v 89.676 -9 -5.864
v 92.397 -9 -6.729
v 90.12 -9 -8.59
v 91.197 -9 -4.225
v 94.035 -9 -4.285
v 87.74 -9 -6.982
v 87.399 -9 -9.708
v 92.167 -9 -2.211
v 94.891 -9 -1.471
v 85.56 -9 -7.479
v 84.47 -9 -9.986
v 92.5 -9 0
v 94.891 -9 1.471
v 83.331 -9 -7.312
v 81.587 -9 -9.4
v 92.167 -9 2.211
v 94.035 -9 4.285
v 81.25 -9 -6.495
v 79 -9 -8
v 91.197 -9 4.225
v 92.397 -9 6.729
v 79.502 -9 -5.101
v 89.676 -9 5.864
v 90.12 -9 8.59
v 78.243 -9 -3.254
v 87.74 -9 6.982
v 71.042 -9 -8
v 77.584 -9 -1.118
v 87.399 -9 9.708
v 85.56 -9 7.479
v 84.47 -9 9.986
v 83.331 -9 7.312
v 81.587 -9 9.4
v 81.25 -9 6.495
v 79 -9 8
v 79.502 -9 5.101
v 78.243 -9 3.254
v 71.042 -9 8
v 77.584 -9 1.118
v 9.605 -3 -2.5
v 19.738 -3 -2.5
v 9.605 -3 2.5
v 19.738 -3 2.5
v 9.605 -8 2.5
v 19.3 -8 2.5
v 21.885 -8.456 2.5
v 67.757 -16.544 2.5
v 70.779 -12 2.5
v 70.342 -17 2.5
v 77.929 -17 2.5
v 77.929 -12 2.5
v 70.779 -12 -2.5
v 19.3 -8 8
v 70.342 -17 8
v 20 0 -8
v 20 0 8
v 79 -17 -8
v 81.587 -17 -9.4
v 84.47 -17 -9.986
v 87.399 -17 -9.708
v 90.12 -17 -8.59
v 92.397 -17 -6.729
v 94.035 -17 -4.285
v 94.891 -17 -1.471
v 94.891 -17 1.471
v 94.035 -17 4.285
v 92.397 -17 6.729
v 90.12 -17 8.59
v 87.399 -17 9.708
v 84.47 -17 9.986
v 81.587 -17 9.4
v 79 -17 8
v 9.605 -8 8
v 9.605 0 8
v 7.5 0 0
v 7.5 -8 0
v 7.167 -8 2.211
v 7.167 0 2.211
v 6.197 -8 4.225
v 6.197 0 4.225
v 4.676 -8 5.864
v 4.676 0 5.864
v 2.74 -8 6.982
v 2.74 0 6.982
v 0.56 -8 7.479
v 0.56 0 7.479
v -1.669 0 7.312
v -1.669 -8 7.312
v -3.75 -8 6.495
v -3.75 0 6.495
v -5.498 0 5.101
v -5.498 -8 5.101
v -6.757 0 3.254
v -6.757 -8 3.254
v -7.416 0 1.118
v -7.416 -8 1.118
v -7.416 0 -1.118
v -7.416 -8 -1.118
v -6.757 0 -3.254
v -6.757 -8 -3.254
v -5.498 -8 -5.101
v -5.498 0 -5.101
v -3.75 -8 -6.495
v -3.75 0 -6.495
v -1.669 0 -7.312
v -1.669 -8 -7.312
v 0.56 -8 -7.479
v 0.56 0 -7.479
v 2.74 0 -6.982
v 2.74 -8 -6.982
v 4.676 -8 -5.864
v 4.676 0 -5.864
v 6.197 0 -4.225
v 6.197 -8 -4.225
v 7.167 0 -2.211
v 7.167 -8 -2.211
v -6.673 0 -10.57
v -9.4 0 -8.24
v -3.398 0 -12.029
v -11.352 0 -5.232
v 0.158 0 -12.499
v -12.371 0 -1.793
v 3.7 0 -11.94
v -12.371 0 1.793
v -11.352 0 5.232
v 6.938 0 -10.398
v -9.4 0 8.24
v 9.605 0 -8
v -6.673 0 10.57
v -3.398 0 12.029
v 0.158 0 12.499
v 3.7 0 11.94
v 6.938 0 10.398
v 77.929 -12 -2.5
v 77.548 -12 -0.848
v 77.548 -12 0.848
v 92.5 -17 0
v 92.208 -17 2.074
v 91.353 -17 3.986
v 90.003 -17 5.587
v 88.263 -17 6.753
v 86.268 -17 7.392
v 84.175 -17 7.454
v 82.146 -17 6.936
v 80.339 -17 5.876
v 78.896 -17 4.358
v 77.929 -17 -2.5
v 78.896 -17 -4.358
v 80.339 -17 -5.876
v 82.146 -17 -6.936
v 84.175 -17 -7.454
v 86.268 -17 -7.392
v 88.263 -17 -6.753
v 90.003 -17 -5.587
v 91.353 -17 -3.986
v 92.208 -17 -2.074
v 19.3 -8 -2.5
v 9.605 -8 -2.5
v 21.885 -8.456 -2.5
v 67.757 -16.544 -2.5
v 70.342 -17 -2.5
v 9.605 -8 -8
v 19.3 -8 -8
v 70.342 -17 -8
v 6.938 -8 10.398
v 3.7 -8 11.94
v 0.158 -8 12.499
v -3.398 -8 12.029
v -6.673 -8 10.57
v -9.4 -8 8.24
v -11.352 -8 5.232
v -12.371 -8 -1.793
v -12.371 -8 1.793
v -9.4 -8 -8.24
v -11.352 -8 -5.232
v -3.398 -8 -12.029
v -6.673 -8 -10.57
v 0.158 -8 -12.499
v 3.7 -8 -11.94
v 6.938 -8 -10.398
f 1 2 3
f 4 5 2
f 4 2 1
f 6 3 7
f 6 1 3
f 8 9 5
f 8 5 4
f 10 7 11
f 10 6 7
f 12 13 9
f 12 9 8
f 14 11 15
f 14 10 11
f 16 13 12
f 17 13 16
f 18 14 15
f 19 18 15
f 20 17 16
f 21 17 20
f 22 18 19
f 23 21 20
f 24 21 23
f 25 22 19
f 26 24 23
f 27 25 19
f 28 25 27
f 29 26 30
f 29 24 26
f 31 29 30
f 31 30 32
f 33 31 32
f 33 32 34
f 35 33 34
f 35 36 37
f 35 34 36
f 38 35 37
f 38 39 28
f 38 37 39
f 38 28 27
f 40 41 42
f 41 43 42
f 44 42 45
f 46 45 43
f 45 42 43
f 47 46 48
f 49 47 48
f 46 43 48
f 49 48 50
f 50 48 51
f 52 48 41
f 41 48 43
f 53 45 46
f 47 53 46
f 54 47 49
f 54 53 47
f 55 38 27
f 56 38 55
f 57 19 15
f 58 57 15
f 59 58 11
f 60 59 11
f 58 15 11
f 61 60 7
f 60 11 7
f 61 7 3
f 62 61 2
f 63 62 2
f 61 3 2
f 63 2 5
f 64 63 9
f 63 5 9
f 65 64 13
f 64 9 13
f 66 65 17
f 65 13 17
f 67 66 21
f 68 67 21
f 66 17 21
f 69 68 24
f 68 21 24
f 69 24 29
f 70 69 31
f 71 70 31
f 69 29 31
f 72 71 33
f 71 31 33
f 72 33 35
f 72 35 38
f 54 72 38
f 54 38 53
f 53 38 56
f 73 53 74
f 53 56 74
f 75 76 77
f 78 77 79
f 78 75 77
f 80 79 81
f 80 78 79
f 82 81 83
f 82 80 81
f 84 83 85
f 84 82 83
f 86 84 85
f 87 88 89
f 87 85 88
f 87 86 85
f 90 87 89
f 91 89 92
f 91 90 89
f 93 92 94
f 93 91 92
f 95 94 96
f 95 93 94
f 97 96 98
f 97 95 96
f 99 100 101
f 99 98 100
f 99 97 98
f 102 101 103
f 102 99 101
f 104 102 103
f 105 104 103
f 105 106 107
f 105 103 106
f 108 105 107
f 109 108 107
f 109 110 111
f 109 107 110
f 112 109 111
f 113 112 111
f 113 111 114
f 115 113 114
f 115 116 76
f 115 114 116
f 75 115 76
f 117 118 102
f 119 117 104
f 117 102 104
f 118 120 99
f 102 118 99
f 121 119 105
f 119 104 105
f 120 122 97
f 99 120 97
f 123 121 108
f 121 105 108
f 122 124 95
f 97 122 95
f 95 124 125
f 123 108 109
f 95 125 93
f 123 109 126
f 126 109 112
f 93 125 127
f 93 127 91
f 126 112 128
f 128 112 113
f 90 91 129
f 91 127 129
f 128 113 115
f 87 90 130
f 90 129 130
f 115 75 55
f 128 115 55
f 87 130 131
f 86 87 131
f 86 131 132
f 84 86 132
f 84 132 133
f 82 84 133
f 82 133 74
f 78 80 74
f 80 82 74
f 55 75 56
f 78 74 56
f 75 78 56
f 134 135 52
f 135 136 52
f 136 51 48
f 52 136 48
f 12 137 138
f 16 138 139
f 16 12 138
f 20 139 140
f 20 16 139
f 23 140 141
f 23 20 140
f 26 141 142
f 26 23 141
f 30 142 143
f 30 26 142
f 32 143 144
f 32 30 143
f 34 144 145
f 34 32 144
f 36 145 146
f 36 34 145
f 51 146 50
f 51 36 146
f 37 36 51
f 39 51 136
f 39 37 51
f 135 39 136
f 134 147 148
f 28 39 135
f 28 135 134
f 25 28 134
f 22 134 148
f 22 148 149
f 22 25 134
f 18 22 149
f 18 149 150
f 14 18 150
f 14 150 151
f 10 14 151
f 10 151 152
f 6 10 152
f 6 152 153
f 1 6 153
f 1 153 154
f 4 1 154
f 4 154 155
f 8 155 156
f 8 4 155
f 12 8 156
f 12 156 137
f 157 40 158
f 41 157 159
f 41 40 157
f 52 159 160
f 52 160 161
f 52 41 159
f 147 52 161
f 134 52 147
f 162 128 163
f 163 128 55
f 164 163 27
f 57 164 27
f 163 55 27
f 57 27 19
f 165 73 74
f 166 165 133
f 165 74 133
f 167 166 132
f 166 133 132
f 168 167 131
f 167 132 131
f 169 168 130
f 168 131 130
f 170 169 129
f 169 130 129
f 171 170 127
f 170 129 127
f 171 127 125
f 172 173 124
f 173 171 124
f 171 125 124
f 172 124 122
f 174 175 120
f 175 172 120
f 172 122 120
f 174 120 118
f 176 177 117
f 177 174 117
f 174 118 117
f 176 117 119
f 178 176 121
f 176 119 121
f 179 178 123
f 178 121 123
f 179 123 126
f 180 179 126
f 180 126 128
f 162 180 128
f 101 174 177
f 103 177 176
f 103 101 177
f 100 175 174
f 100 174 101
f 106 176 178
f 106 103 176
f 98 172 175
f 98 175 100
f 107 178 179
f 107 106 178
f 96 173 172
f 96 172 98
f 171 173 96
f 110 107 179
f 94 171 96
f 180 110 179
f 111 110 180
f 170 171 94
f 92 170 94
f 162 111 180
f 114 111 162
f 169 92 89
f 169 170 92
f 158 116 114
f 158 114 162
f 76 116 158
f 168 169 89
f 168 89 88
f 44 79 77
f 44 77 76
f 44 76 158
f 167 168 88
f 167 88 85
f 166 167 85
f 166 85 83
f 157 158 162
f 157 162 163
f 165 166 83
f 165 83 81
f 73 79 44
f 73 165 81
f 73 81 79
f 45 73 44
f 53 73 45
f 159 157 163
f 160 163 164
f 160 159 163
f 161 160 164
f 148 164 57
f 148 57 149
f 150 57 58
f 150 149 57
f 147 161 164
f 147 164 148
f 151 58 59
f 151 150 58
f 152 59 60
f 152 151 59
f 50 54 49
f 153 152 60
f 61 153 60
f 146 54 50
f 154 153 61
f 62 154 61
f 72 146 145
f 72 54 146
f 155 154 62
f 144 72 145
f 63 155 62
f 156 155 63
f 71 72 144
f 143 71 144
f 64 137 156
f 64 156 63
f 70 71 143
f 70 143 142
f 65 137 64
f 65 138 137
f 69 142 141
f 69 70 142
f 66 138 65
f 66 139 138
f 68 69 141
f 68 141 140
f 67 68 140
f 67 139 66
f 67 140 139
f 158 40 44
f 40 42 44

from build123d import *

# Parameters (mm, degrees)
F0_R     = 7.5
F1_DEPTH = 25
F3_DEPTH = 12.5
F5_DEPTH = 2.5


with BuildPart() as f1:
    # F0 (on Front) → F1 (new body)
    with BuildSketch(Plane.XZ):
        with BuildLine():
            ThreePointArc((9.6046863561, -8), (11.7539052968, -4.2539052968), (12.5, 0))
            ThreePointArc((12.5, 0), (11.7539052968, 4.2539052968), (9.6046863561, 8))
            ThreePointArc((9.6046863561, 8), (-12.5, 0), (9.6046863561, -8))
        make_face()
        Circle(F0_R, mode=Mode.SUBTRACT)
        with BuildLine():
            ThreePointArc((95, 0), (89.472135955, 8.94427191), (79, 8))
            ThreePointArc((79, 8), (75, 0), (79, -8))
            ThreePointArc((79, -8), (89.472135955, -8.94427191), (95, 0))
        make_face()
        with Locations((85, 0)):
            Circle(F0_R, mode=Mode.SUBTRACT)
        with BuildLine():
            ThreePointArc((9.6046863561, 8), (11.7539052968, 4.2539052968), (12.5, 0))
            ThreePointArc((12.5, 0), (11.7539052968, -4.2539052968), (9.6046863561, -8))
            Line((9.6046863561, -8), (79, -8))
            ThreePointArc((79, -8), (75, 0), (79, 8))
            Line((79, 8), (9.6046863561, 8))
        make_face()
    extrude(amount=F1_DEPTH)

    # F2 (on Top) → F3 (intersect, symmetric)
    with BuildSketch(Plane.XY):
        Polygon((20, 0), (-12.5, 0), (-12.5, -8), (19.3000906918, -8), (70.3416270684, -17), (95, -17), (95, -9), (71.0415363766, -9), align=None)
    extrude(amount=F3_DEPTH, both=True, mode=Mode.INTERSECT)

    # F4 (on Top) → F5 (cut, symmetric)
    with BuildSketch(Plane.XY):
        Polygon((9.6046863561, -3), (9.6046863561, -8), (19.3000906918, -8), (21.884876116, -8.4557674096), (67.7568416441, -16.5442325904), (70.3416270684, -17), (79, -17), (79, -12), (70.779070386, -12), (19.7375340094, -3), align=None)
    extrude(amount=F5_DEPTH, both=True, mode=Mode.SUBTRACT)


solid = f1.part
